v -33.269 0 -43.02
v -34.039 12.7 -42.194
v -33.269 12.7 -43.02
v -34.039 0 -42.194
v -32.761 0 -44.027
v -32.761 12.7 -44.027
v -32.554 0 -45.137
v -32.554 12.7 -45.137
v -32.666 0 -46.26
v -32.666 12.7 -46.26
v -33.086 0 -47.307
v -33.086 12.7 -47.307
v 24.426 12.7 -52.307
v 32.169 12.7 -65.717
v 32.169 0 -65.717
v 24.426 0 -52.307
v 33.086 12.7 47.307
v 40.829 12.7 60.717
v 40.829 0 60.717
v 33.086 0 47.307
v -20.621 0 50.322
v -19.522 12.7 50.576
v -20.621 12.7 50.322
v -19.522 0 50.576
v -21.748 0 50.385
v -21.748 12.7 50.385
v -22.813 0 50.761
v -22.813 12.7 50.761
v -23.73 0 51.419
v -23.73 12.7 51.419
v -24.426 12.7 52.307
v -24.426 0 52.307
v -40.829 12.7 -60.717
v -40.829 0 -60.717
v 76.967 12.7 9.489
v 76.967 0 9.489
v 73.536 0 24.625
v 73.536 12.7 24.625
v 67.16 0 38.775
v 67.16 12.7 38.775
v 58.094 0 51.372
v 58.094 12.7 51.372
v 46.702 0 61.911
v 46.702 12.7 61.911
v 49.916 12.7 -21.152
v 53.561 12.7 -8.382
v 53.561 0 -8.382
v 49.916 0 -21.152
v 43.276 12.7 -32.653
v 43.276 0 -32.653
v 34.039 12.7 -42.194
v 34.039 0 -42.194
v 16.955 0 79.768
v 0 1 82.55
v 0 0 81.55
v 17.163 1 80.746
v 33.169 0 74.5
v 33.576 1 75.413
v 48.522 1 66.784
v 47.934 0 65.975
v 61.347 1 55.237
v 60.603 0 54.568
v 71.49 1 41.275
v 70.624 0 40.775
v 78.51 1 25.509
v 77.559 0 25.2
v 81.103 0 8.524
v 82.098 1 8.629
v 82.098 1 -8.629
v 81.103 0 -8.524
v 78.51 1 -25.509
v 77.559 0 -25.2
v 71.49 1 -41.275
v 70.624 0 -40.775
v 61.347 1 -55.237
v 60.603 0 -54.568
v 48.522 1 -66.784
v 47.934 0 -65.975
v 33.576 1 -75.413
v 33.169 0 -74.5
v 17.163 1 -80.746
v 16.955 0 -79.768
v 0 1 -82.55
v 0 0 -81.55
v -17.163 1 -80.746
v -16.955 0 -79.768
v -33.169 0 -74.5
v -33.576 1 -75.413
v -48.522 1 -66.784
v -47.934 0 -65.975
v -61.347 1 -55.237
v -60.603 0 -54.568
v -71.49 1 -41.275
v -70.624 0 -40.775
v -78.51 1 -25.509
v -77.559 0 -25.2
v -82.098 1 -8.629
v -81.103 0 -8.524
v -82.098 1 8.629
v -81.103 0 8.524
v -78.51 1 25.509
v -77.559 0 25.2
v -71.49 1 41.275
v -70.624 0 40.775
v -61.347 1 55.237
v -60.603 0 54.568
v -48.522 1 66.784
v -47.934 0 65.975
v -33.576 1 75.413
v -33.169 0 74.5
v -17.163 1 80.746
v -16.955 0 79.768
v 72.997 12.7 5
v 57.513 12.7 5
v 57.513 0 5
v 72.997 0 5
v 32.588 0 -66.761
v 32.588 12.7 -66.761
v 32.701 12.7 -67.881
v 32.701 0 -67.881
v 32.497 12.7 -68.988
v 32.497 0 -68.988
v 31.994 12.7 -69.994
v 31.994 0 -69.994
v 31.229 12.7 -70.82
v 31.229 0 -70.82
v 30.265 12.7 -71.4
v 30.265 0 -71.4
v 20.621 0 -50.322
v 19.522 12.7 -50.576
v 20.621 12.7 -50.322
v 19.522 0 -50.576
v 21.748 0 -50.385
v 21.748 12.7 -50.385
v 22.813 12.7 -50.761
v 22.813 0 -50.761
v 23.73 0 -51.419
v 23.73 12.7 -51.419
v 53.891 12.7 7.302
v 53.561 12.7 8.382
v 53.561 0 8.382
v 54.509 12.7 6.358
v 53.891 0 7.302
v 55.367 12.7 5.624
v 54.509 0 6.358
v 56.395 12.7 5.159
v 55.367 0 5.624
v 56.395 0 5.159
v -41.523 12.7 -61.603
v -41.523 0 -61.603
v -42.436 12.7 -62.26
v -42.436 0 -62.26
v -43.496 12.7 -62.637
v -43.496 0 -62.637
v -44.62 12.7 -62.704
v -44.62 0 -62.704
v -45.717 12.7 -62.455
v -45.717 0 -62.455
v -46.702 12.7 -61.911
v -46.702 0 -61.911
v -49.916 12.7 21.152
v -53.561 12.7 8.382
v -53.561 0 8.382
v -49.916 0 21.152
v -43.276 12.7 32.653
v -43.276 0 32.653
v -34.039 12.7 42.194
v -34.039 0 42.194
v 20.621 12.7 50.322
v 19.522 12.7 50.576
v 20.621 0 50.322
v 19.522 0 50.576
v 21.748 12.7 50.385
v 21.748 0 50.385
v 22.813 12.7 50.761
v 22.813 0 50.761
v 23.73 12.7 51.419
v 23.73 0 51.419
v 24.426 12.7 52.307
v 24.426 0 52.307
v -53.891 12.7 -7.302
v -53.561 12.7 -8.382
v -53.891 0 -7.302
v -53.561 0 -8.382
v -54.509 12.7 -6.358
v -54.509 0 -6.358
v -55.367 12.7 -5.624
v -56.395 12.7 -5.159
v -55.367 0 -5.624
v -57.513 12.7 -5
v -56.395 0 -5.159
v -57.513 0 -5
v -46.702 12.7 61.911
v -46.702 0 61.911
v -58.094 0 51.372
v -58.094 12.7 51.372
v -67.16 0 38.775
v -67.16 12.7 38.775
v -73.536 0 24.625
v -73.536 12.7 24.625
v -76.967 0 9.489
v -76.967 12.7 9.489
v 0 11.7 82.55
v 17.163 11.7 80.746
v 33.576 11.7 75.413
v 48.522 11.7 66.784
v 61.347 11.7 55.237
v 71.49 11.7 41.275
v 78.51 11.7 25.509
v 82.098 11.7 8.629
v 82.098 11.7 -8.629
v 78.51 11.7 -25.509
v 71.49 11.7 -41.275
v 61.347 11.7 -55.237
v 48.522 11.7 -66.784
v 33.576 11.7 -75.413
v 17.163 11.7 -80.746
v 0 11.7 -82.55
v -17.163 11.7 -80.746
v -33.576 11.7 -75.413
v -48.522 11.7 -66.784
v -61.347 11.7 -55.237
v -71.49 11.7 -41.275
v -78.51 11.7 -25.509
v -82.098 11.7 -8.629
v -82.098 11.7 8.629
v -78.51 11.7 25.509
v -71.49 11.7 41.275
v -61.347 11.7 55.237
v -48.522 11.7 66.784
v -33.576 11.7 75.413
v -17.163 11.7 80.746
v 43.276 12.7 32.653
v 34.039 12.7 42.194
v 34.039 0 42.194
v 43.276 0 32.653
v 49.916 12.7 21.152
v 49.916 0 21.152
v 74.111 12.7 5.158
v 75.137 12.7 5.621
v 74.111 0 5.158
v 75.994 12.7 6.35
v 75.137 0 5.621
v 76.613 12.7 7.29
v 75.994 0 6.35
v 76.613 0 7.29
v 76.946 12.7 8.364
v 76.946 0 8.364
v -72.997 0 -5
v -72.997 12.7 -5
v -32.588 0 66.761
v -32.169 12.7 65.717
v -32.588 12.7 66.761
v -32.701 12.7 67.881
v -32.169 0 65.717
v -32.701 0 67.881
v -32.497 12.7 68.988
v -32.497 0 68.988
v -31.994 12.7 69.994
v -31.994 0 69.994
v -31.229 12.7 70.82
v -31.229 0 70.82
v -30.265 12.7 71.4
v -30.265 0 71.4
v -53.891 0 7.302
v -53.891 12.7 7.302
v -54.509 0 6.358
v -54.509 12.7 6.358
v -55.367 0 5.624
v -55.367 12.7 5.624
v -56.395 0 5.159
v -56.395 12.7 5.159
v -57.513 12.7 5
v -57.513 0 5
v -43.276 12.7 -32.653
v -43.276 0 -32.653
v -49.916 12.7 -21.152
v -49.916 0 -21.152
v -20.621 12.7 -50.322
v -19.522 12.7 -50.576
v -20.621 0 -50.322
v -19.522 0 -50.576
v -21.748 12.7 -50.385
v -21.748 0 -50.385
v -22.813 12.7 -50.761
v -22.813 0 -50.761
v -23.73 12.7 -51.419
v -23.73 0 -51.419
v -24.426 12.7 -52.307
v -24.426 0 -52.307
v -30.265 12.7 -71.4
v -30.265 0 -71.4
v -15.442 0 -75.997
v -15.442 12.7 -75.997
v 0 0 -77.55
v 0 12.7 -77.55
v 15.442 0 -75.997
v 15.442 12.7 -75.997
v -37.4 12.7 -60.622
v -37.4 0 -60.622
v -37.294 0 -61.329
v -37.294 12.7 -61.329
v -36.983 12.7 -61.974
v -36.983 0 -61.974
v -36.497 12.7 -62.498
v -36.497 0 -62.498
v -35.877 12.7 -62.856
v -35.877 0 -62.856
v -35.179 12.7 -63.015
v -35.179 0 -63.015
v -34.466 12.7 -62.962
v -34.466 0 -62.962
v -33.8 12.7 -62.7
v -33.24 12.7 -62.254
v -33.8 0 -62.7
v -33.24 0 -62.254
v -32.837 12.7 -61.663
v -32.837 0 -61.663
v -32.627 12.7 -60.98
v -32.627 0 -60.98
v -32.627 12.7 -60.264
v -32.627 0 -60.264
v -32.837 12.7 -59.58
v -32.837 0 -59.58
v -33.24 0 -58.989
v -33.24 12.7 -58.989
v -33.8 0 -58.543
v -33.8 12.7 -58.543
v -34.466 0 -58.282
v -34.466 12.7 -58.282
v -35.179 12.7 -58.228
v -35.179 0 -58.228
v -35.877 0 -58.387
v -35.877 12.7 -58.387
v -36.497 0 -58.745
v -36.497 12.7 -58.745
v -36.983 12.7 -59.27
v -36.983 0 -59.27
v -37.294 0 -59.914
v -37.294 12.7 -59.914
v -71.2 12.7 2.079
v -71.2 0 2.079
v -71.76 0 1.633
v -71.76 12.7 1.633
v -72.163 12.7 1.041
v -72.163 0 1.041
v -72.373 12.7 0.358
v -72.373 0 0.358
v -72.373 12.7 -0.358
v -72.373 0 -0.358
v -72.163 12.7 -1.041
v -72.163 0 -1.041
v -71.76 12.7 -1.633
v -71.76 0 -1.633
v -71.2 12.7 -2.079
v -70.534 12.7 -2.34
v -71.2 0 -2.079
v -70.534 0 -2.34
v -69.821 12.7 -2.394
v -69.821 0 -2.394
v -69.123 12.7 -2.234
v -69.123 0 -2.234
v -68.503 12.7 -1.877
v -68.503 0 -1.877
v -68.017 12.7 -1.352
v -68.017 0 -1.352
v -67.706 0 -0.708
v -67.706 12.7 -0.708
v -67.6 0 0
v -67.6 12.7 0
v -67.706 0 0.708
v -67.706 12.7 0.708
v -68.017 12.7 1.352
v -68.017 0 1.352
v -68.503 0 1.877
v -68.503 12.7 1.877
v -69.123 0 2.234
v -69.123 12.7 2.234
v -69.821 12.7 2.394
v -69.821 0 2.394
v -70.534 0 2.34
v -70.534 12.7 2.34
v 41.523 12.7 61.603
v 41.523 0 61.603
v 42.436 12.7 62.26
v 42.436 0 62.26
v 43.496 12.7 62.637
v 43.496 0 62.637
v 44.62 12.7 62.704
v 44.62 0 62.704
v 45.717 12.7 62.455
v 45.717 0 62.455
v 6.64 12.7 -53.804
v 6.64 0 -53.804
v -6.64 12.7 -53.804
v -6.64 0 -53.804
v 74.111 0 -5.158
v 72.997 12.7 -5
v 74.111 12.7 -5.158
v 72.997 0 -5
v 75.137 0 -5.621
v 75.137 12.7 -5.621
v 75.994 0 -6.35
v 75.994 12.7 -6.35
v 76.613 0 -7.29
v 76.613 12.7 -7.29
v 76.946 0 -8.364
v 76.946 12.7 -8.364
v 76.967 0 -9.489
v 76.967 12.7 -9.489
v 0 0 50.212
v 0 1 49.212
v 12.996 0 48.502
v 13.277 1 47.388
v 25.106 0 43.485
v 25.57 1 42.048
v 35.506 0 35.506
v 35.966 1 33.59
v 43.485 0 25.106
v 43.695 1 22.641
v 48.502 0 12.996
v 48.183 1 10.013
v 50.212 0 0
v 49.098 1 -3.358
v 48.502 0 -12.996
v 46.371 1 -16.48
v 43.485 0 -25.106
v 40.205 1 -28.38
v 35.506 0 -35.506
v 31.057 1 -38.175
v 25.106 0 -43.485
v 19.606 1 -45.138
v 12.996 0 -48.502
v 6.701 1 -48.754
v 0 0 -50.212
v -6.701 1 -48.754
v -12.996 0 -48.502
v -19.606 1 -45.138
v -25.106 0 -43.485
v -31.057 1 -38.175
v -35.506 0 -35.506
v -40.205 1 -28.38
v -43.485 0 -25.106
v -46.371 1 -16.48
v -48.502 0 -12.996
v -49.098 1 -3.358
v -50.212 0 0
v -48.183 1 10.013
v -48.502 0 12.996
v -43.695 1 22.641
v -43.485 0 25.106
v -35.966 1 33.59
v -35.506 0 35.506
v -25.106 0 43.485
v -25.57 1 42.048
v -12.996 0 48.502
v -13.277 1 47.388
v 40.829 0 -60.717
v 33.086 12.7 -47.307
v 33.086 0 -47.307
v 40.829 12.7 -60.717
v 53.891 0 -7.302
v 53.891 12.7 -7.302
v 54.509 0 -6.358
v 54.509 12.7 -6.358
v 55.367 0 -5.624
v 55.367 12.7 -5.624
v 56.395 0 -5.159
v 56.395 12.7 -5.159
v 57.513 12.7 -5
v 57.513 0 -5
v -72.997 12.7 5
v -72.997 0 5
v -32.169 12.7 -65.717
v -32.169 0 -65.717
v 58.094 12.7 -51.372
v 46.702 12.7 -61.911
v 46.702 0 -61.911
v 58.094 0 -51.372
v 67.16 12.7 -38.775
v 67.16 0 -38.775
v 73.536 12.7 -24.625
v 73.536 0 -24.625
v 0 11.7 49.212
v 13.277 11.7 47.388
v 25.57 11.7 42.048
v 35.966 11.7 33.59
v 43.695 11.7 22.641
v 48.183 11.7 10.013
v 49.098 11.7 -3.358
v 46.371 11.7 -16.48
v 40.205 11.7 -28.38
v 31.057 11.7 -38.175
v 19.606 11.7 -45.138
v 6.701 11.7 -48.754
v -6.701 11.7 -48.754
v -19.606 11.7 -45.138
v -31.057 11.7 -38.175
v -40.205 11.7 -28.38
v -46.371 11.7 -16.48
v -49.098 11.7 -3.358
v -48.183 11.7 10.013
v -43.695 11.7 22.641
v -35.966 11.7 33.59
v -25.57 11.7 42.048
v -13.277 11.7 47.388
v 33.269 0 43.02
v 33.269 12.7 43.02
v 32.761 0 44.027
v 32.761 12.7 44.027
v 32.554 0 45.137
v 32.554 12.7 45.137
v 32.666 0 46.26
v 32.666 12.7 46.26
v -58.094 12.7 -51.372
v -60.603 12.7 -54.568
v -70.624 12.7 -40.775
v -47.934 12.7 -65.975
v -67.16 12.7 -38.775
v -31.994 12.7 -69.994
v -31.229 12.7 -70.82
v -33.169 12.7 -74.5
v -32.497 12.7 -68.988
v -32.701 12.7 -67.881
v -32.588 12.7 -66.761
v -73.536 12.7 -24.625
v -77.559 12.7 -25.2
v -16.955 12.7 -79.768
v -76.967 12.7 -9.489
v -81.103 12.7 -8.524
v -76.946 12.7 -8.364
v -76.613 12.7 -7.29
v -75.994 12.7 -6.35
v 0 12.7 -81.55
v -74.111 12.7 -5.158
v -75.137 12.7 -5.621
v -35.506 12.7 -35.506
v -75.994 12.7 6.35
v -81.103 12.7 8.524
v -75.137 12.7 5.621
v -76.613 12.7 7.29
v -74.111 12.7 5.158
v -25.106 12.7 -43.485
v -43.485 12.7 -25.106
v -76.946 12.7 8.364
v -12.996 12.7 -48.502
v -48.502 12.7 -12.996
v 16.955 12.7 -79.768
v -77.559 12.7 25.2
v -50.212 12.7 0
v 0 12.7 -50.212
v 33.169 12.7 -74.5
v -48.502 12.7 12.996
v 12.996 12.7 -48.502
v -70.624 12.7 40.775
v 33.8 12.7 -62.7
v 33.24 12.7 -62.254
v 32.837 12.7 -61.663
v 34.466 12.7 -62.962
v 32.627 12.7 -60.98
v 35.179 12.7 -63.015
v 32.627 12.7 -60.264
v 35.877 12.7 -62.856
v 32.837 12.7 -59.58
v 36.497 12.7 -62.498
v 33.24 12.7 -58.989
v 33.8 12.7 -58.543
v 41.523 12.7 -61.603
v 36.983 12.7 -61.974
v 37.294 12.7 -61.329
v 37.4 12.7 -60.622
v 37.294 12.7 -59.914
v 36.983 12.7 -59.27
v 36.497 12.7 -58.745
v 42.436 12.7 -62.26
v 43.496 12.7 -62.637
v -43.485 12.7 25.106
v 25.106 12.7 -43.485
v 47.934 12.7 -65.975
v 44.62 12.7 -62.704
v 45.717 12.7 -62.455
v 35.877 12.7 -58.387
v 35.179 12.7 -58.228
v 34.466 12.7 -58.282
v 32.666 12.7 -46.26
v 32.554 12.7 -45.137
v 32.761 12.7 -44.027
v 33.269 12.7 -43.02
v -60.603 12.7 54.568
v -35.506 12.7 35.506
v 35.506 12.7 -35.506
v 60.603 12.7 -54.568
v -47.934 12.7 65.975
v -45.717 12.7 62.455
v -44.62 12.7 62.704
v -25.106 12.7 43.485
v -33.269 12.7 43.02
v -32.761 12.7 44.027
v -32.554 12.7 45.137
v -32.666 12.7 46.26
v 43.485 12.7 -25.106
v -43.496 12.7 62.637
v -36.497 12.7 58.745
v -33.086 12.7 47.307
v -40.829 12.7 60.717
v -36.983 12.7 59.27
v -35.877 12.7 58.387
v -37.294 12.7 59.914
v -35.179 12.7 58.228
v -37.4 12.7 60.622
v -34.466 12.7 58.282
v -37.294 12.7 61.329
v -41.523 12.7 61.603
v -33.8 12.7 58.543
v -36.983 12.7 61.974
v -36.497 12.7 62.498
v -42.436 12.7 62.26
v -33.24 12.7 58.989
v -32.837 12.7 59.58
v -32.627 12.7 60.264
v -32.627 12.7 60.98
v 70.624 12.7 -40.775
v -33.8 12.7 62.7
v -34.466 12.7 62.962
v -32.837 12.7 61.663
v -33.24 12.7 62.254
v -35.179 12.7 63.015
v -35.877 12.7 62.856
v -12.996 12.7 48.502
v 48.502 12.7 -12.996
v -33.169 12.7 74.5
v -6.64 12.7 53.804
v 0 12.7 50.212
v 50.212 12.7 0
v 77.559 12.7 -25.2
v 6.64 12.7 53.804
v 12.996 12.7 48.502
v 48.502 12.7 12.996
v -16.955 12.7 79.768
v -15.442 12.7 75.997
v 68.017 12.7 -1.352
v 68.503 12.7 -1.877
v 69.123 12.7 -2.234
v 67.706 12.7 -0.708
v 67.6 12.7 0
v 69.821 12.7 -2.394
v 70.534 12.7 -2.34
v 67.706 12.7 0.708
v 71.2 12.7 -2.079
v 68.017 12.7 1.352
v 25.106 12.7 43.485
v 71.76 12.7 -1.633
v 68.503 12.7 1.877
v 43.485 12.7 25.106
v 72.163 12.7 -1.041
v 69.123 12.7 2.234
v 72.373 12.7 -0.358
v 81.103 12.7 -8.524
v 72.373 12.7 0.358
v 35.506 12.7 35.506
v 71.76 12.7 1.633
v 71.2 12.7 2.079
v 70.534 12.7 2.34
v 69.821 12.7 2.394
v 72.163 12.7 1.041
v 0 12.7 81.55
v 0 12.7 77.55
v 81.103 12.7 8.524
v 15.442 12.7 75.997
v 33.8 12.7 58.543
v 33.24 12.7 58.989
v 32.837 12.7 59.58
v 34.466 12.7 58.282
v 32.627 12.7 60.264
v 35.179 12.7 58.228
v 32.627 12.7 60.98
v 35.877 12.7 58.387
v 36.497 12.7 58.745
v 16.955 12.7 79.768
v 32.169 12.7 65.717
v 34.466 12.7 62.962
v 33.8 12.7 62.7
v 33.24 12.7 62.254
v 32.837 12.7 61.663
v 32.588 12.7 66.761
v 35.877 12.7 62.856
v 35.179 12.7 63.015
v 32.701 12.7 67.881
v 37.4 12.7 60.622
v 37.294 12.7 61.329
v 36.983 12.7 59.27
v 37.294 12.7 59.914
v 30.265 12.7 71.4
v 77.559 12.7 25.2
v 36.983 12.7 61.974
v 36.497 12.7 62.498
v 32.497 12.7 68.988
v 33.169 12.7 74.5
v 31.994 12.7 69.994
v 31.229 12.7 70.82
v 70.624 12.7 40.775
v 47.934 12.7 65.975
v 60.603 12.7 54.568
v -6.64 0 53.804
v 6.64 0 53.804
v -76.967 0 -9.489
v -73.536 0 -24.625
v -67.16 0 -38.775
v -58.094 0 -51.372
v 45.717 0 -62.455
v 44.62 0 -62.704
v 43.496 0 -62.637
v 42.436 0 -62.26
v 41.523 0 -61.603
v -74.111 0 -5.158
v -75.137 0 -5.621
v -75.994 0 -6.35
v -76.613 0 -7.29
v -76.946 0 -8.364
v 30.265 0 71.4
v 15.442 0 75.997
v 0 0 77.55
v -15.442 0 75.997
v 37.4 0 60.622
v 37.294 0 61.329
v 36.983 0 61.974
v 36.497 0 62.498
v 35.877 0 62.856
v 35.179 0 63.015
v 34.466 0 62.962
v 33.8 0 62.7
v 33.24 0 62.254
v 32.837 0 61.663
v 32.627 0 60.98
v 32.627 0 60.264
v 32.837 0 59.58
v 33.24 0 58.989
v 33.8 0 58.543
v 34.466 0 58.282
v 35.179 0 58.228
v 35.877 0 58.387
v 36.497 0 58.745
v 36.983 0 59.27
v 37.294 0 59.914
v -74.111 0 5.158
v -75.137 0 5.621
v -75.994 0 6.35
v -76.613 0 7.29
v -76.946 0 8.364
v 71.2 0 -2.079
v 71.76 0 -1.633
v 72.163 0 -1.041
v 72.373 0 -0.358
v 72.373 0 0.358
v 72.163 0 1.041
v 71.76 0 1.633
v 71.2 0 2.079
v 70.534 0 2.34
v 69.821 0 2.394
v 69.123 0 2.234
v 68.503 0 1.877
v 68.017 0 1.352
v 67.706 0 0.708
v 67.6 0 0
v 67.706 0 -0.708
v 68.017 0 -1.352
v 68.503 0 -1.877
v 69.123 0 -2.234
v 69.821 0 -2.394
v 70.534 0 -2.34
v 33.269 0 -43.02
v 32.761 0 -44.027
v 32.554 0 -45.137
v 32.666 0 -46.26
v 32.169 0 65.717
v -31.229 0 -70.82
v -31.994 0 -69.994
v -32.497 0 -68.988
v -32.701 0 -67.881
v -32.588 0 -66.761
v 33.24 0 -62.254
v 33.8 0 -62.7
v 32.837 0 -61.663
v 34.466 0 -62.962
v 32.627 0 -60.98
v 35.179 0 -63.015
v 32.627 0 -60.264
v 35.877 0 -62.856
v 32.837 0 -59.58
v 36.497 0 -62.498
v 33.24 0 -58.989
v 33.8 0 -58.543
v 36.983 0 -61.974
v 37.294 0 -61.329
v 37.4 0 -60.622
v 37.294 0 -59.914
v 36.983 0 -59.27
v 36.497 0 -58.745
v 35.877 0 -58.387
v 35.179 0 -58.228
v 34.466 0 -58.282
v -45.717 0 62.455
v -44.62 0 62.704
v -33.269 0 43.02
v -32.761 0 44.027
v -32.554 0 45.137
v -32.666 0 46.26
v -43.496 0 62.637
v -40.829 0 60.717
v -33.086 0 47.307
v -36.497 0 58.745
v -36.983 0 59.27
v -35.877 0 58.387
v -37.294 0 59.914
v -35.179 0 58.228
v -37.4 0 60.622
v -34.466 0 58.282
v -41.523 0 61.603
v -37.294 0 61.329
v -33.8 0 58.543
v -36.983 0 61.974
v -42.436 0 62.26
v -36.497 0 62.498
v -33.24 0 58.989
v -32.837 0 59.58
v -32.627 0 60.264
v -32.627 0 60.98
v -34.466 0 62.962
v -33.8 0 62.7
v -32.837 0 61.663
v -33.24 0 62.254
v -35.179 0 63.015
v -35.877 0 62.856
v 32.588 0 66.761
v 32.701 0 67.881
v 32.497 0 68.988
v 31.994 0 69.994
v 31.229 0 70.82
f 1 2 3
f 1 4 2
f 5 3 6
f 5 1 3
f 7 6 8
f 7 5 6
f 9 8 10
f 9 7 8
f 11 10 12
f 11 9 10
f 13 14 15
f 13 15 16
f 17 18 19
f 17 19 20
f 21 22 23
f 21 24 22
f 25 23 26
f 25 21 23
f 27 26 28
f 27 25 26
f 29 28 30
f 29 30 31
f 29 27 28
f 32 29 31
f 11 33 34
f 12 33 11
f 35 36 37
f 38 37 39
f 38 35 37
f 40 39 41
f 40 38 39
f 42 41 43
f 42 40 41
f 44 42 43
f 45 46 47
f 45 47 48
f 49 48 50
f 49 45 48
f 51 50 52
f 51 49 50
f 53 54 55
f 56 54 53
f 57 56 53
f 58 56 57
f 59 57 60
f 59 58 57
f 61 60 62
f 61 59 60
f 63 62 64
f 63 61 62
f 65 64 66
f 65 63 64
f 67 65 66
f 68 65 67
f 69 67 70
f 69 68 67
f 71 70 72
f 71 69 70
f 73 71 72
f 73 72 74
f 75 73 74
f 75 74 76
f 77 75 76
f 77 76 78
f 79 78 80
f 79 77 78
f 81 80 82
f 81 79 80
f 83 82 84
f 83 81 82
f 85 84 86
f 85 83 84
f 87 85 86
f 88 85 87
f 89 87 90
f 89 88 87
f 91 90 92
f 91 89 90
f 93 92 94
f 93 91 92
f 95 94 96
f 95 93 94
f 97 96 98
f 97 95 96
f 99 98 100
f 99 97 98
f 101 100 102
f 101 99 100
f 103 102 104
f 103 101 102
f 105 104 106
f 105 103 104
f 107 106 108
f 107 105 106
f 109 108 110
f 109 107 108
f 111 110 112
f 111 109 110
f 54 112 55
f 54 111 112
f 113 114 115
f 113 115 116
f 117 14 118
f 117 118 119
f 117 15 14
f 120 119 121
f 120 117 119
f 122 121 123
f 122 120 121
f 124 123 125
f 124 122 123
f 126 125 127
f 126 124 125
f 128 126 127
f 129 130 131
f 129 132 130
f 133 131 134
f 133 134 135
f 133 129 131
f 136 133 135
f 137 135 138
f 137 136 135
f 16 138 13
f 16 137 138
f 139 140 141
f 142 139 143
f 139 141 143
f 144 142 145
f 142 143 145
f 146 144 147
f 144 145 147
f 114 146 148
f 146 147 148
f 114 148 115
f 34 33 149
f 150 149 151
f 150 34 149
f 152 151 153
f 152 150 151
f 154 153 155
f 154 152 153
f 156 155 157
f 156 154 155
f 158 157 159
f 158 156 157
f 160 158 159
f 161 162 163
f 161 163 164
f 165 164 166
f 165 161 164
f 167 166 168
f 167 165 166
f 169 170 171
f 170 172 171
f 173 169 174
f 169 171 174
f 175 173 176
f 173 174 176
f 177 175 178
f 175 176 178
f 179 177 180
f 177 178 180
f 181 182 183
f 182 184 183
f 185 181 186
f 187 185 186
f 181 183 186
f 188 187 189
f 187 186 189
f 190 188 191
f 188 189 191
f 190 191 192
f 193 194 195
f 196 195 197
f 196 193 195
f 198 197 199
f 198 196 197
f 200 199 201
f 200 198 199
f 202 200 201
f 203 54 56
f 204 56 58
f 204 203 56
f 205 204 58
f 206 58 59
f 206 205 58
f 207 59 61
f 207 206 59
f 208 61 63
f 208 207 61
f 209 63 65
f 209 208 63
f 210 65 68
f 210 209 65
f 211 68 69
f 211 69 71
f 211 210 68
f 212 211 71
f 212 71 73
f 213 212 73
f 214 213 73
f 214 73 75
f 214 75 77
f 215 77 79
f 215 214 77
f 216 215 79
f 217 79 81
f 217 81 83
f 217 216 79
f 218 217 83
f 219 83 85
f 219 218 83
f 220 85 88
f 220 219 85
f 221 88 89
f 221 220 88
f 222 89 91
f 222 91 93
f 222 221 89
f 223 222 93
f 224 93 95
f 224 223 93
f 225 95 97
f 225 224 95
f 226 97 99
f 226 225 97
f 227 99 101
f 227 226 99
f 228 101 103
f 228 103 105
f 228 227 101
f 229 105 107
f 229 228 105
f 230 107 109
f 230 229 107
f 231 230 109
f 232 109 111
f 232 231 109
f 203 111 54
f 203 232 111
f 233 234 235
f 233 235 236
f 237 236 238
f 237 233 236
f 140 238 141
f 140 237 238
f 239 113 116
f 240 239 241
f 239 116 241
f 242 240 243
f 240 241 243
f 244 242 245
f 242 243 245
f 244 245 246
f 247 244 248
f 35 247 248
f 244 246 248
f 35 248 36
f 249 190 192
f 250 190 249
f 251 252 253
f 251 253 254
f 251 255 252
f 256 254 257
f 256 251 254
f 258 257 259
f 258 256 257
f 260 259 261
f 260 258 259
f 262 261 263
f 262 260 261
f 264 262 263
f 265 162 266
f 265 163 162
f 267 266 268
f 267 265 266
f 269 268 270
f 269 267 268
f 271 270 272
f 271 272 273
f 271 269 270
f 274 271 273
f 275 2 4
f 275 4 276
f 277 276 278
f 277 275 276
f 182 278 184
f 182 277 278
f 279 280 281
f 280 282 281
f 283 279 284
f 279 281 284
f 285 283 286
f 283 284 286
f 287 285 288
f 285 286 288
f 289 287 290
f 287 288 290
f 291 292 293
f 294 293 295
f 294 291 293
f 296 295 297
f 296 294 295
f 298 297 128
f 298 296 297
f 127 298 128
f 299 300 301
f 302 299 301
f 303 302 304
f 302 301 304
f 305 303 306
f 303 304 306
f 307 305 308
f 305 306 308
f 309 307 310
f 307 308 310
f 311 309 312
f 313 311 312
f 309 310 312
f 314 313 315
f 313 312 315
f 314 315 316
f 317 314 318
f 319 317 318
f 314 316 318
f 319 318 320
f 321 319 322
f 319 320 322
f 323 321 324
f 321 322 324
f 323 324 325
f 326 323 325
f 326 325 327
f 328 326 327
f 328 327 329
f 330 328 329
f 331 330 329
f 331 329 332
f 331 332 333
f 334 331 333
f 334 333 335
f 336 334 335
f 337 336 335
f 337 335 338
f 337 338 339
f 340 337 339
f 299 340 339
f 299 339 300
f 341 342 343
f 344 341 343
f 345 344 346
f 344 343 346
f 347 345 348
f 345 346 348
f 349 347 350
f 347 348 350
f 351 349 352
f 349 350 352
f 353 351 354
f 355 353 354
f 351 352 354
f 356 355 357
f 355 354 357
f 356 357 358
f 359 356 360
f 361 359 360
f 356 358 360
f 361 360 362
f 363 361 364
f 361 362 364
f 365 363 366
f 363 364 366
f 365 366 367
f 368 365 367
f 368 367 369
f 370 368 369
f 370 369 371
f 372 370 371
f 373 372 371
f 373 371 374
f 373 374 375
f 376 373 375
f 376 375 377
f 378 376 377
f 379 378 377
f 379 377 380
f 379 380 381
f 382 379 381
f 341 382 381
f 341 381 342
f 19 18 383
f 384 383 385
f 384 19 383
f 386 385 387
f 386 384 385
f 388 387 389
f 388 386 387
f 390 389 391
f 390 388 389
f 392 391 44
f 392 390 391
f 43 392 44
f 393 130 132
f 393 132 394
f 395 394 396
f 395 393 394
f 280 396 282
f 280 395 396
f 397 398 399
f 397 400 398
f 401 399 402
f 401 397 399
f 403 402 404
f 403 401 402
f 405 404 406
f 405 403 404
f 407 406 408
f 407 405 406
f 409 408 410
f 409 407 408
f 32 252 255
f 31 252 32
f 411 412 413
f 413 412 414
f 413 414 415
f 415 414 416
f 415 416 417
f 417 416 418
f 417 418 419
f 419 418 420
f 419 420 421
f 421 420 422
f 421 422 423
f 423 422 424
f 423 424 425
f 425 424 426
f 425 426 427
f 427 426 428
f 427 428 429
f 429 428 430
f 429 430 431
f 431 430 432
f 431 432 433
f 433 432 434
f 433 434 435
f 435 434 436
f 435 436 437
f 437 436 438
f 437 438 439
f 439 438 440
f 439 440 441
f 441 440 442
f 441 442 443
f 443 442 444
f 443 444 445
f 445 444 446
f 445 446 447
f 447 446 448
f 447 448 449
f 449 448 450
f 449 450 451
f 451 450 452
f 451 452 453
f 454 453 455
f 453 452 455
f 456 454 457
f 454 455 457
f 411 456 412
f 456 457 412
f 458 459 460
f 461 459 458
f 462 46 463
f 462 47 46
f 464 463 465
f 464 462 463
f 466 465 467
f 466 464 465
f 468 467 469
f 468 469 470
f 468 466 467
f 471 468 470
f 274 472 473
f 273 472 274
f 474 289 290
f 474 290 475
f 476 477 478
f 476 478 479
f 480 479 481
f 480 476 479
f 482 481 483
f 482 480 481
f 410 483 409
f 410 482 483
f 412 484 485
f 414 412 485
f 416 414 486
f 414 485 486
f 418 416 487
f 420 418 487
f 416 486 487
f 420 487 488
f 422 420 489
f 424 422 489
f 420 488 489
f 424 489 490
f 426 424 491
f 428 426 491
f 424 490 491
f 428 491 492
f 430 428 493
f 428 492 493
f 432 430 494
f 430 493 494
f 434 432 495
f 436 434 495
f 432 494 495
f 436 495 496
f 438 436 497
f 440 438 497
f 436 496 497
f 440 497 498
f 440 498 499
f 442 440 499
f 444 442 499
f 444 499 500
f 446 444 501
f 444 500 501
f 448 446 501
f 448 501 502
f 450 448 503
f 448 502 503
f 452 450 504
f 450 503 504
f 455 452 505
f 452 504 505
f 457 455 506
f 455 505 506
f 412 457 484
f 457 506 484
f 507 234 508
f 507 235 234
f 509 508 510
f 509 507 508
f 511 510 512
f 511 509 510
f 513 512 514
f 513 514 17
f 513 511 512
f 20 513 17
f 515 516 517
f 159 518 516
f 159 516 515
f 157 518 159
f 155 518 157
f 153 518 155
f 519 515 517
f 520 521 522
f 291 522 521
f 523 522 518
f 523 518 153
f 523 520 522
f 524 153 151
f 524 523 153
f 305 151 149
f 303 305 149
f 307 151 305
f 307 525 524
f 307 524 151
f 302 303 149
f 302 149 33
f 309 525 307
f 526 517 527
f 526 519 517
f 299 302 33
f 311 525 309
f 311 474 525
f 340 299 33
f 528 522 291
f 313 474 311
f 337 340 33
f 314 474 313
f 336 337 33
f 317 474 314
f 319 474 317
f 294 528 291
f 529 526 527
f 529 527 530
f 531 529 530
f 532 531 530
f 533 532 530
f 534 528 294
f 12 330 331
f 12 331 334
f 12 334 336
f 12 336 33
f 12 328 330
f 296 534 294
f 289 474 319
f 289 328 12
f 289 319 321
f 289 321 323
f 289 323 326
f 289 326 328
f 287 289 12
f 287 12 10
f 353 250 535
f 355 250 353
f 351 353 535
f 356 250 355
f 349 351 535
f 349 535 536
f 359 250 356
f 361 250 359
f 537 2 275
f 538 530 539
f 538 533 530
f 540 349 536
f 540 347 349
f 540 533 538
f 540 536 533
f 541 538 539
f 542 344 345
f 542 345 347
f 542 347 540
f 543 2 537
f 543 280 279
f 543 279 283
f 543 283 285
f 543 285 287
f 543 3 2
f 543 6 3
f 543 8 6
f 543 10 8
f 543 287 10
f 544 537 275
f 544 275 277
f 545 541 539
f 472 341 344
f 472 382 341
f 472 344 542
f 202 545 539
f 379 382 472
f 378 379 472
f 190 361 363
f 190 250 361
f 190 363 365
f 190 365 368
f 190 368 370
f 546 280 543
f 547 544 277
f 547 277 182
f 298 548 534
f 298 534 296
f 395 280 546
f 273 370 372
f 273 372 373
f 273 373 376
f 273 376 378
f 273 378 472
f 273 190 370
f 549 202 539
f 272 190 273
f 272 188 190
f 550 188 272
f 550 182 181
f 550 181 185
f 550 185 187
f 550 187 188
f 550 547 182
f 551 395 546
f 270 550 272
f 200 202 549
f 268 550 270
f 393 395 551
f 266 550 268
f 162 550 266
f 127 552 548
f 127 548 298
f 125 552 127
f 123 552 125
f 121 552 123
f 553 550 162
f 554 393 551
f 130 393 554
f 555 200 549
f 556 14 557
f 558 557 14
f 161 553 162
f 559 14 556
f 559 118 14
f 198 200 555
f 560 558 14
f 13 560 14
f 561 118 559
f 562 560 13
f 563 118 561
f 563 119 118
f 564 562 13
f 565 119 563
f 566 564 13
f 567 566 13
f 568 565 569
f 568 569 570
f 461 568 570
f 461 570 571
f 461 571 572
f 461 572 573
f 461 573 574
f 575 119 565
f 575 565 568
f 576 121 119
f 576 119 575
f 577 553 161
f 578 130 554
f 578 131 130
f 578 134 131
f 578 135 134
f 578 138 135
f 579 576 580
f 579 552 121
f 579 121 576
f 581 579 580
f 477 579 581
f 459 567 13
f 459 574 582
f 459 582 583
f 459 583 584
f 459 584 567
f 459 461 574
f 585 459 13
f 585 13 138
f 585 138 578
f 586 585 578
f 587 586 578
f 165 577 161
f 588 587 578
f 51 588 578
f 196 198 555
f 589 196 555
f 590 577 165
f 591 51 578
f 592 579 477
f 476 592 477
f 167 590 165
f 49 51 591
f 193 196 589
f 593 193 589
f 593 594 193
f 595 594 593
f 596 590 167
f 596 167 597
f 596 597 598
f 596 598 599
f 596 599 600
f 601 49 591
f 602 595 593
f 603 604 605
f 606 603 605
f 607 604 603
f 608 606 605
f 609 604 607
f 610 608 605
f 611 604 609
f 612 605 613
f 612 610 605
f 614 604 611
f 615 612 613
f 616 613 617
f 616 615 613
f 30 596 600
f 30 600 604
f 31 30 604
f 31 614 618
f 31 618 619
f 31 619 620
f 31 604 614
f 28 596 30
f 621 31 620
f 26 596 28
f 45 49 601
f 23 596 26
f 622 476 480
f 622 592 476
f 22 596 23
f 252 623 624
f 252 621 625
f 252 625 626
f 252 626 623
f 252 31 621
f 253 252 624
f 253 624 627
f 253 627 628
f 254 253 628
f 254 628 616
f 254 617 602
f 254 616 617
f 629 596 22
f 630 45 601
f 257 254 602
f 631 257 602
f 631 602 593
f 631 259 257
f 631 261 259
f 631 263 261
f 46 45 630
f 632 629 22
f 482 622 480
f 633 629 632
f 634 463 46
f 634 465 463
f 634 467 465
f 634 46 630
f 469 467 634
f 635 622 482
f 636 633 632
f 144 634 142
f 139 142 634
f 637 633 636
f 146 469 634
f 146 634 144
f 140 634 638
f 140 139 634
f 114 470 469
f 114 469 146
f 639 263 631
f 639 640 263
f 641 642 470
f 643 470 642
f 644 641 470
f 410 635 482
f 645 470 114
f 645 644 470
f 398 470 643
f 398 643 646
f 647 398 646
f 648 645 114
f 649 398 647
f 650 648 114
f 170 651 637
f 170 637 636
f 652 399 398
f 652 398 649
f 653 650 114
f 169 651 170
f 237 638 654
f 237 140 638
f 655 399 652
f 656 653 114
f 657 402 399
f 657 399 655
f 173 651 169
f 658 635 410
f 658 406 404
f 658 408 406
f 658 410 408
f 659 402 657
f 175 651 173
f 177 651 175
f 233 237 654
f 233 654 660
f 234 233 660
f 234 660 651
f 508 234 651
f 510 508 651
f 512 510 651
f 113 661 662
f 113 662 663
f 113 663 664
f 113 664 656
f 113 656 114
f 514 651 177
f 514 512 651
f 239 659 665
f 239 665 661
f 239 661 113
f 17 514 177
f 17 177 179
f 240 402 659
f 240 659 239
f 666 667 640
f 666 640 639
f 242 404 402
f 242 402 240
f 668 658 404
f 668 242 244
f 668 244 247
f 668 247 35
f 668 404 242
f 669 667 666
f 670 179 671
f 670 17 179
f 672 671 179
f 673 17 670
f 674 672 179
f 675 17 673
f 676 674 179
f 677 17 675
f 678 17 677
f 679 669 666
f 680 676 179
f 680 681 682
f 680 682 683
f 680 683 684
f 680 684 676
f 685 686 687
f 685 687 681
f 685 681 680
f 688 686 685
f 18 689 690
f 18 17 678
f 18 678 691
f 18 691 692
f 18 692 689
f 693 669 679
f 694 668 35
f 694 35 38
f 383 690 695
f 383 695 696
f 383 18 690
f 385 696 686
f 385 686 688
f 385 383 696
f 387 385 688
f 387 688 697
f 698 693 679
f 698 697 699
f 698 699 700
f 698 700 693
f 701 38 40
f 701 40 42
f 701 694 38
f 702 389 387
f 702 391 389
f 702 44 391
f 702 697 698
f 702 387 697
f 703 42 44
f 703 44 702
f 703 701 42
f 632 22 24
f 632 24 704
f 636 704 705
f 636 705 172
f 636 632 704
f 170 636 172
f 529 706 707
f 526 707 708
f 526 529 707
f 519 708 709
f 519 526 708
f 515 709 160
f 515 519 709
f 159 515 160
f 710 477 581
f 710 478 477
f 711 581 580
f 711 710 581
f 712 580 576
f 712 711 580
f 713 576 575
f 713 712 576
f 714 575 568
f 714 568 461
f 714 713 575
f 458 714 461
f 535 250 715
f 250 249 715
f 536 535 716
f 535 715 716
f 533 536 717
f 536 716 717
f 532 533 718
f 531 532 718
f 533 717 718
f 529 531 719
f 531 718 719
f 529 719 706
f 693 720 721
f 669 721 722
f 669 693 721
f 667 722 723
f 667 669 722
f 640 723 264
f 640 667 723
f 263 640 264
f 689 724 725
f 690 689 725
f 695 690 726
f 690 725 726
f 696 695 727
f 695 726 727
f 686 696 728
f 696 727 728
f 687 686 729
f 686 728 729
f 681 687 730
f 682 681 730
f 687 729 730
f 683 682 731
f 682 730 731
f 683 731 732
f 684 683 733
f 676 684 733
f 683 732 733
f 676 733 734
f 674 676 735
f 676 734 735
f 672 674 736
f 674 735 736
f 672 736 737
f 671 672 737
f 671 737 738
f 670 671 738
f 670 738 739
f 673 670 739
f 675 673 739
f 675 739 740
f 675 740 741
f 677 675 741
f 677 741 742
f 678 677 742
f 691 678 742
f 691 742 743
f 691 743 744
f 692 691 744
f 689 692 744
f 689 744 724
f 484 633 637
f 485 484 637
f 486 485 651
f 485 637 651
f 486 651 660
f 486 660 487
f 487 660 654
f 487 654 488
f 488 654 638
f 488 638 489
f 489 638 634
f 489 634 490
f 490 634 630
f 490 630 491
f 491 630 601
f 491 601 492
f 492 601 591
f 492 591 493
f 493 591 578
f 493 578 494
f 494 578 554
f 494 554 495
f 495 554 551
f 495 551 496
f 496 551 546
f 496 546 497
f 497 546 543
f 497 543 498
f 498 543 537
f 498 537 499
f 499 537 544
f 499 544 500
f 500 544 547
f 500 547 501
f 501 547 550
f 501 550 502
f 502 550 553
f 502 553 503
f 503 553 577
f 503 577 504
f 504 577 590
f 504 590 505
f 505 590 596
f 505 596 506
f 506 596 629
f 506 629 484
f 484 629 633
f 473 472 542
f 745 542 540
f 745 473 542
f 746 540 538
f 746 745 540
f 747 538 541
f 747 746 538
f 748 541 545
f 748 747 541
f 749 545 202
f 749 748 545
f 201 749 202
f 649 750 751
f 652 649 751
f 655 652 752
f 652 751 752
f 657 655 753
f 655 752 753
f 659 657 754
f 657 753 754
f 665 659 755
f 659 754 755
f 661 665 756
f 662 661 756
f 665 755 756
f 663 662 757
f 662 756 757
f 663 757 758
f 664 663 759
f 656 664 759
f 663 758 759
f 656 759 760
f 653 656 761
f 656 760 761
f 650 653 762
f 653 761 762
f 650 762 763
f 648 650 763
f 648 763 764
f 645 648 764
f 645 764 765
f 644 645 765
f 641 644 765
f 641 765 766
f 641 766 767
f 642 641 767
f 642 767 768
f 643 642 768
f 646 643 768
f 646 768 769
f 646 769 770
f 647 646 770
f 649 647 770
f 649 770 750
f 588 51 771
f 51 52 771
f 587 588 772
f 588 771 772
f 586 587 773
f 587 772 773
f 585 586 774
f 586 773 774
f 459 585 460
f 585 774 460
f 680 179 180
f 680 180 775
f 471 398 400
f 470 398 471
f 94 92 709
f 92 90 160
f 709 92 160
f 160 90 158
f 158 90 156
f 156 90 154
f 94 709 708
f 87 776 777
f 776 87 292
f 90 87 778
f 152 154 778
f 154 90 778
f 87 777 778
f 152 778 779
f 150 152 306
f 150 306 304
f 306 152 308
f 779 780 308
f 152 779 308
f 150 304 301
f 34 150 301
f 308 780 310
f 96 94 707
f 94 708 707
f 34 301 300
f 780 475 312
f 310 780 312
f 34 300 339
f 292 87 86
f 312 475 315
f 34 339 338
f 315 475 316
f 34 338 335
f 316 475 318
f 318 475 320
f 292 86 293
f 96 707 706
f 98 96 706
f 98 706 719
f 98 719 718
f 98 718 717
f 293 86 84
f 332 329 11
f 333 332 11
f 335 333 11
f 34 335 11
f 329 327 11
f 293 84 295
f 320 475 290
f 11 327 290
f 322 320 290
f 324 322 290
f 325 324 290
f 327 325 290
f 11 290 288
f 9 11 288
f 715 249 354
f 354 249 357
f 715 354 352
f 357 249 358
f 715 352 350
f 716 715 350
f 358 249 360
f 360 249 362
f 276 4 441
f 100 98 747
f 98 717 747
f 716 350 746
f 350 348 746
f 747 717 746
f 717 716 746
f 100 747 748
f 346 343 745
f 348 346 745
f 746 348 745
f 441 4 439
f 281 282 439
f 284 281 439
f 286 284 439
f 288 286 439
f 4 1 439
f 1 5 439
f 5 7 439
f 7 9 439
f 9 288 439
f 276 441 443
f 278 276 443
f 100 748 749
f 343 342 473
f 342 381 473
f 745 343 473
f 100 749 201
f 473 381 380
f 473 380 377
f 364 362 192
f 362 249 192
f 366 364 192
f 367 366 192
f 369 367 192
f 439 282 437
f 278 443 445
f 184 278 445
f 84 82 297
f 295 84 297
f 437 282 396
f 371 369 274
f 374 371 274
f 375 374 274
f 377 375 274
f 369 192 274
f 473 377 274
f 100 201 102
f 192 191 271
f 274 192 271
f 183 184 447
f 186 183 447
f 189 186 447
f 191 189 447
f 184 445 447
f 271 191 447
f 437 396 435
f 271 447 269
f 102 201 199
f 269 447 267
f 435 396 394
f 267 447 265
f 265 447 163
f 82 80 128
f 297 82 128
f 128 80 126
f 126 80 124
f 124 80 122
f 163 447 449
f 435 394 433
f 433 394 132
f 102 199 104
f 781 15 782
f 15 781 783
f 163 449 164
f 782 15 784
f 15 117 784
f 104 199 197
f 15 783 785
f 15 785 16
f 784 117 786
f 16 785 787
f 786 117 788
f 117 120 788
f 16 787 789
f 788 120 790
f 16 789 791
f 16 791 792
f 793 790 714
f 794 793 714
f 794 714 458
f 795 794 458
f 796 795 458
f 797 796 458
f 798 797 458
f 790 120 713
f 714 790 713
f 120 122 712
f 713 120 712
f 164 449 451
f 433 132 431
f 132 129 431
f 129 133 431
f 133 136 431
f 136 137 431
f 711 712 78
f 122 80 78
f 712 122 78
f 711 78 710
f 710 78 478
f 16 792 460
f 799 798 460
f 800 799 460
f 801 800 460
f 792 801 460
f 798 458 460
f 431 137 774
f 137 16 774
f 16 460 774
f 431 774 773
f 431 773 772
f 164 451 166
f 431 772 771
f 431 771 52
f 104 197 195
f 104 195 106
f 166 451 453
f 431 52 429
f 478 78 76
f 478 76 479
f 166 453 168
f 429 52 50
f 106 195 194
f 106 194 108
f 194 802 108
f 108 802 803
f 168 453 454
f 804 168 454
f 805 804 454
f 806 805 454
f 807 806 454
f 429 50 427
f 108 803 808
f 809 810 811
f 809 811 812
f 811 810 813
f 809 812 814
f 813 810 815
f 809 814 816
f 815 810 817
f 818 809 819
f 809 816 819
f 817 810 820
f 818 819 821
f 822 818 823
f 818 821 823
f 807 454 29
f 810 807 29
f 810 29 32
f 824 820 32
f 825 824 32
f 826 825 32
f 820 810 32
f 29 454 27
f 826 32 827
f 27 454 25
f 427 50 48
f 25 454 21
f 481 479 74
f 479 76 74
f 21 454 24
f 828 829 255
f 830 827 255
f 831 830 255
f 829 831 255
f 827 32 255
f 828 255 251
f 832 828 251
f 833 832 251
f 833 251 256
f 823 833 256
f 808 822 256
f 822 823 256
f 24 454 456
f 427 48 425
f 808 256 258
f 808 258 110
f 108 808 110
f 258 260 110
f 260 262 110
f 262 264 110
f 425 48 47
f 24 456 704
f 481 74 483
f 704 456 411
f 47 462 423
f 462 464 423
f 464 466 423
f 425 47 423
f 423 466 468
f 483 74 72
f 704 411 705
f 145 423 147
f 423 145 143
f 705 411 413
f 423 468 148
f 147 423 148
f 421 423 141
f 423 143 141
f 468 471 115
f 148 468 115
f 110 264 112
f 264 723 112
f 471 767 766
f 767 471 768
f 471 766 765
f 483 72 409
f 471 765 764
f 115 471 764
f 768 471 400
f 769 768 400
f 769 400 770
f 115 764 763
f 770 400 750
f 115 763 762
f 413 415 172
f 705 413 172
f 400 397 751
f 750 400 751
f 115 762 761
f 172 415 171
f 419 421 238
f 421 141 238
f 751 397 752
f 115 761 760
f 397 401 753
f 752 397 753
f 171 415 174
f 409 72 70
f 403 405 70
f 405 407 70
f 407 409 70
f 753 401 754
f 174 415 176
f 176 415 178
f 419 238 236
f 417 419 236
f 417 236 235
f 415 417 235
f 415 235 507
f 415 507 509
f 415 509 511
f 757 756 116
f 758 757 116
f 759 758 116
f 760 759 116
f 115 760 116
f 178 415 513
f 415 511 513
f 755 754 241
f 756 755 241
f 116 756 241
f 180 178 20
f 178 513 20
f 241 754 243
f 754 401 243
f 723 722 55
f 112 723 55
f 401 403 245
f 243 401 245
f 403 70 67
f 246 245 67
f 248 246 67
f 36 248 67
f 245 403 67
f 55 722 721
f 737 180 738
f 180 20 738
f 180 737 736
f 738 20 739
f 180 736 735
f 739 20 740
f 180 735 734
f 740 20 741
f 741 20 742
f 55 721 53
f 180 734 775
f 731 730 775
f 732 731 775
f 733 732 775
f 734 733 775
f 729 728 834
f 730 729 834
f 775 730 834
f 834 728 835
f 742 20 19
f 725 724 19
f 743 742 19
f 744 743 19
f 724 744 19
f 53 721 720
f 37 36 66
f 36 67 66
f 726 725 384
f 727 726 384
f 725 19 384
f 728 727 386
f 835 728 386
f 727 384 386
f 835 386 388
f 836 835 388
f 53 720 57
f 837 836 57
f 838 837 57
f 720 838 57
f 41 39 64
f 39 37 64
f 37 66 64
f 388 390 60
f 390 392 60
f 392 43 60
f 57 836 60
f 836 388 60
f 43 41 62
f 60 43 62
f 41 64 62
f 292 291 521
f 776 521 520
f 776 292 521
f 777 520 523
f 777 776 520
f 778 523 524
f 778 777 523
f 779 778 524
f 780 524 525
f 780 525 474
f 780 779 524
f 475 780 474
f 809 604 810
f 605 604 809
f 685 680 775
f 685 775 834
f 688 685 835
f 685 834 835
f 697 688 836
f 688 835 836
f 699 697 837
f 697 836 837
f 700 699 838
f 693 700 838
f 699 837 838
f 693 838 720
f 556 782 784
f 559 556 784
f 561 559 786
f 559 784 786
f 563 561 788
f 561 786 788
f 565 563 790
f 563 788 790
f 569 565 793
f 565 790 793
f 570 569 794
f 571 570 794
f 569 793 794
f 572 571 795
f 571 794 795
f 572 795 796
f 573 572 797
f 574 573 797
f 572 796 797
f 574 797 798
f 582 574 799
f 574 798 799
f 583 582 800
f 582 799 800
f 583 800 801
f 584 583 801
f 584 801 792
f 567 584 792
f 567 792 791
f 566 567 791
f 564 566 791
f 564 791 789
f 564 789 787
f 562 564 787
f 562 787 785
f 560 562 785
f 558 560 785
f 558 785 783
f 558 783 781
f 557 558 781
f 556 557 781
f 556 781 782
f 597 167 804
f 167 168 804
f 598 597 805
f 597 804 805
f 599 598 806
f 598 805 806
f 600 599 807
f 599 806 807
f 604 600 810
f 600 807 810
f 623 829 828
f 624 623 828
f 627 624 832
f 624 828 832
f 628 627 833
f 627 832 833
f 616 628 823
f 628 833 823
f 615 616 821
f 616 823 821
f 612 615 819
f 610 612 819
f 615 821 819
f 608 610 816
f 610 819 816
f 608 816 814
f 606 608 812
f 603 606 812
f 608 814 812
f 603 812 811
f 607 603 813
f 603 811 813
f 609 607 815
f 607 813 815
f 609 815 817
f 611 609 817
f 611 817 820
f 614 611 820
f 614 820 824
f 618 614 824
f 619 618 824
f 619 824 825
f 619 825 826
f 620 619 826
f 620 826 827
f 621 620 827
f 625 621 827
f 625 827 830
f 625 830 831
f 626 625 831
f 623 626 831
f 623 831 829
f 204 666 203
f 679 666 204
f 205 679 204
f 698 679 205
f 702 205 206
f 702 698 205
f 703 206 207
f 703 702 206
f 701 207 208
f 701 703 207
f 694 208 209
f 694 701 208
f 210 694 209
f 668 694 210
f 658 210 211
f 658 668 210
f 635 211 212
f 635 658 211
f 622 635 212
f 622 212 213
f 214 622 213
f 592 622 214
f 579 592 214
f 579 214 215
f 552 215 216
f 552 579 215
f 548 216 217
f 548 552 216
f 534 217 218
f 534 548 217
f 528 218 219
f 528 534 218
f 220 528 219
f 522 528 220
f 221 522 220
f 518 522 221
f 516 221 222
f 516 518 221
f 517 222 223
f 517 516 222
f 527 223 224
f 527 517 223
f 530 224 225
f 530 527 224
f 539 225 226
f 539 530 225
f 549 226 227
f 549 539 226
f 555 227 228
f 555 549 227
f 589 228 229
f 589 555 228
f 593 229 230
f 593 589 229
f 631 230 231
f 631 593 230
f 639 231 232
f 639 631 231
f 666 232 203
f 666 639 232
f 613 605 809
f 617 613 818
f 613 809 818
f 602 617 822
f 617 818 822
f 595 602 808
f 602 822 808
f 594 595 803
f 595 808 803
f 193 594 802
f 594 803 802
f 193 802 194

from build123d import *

# Parameters (mm, degrees)
SKETCH2_W                   = 33.3375
SKETCH2_H                   = 12.7
F_12_0_189_DIAMETER_HOLE1_D = 4.8006
CIRPATTERN3_COUNT           = 6
CUT_EXTRUDE1_DEPTH          = 13.7
FILLET1_R                   = 4
CIRPATTERN4_COUNT           = 6
FILLET1_OF_CIRPATTERN4_R    = 4
CHAMFER1_SIZE               = 1
CHAMFER2_SIZE               = 1


with BuildPart() as part:
    # Sketch2 → Revolve1 (revolve)
    with BuildSketch(Plane(origin=(0, 0, 0), x_dir=(0, 0, -1), z_dir=(1, 0, 0))):
        with Locations((-65.88125, 6.35)):
            Rectangle(SKETCH2_W, SKETCH2_H)
    revolve(axis=Axis((0, -0.635, 0), (0, 1, 0)))

    # #12 (0.189) Diameter Hole1 (through all)
    with Locations(Plane(origin=(0, 12.7, 0), x_dir=(1, 0, 0), z_dir=(0, 1, 0))):
        with Locations((-35, 60.621778)):
            f_12_0_189_diameter_hole1 = Hole(F_12_0_189_DIAMETER_HOLE1_D / 2)

    # CirPattern3: #12 (0.189) Diameter Hole1 ×6 about axis
    cirpattern3_axis = Axis((0, 0, 0), (0, 1, 0))
    for i in range(1, CIRPATTERN3_COUNT):
        add(f_12_0_189_diameter_hole1.rotate(cirpattern3_axis, i * 360 / CIRPATTERN3_COUNT), mode=Mode.SUBTRACT)

    # Sketch8 → Cut-Extrude1 (cut, through all)
    with BuildSketch(Plane(origin=(0, 12.7, 0), x_dir=(1, 0, 0), z_dir=(0, 1, 0))):
        with BuildLine():
            Line((-22.66059, 49.249293), (-34.364196, 69.520533))
            ThreePointArc((-34.364196, 69.520533), (0, 77.55), (34.364196, 69.520533))
            Line((34.364196, 69.520533), (22.66059, 49.249293))
            ThreePointArc((22.66059, 49.249293), (0, 54.2125), (-22.66059, 49.249293))
        make_face()
    cut_extrude1 = extrude(amount=-CUT_EXTRUDE1_DEPTH, mode=Mode.SUBTRACT)

    # Fillet1
    fillet1_edges = [part.edges().sort_by_distance(p)[0] for p in [
        (22.66059, 6.35, -49.249293),
        (-22.66059, 6.35, -49.249293),
        (-34.364196, 6.35, -69.520533),
        (34.364196, 6.35, -69.520533),
    ]]
    fillet(fillet1_edges, radius=FILLET1_R)

    # CirPattern4: Cut-Extrude1 ×6 about axis
    cirpattern4_axis = Axis((0, 0, 0), (0, 1, 0))
    for i in range(1, CIRPATTERN4_COUNT):
        add(cut_extrude1.rotate(cirpattern4_axis, i * 360 / CIRPATTERN4_COUNT), mode=Mode.SUBTRACT)

    # Fillet1 of CirPattern4
    fillet1_of_cirpattern4_edges = [part.edges().sort_by_distance(p)[0] for p in [
        (-31.320844, 6.35, -44.249293),
        (-53.981433, 6.35, -5),
        (-77.388646, 6.35, -5),
        (-43.02445, 6.35, -64.520533),
        (-53.981433, 6.35, 5),
        (-31.320844, 6.35, 44.249293),
        (-43.02445, 6.35, 64.520533),
        (-77.388646, 6.35, 5),
        (-22.66059, 6.35, 49.249293),
        (22.66059, 6.35, 49.249293),
        (34.364196, 6.35, 69.520533),
        (-34.364196, 6.35, 69.520533),
        (31.320844, 6.35, 44.249293),
        (53.981433, 6.35, 5),
        (77.388646, 6.35, 5),
        (43.02445, 6.35, 64.520533),
        (53.981433, 6.35, -5),
        (31.320844, 6.35, -44.249293),
        (43.02445, 6.35, -64.520533),
        (77.388646, 6.35, -5),
    ]]
    fillet(fillet1_of_cirpattern4_edges, radius=FILLET1_OF_CIRPATTERN4_R)

    # Chamfer1
    chamfer1_edges = [part.edges().sort_by_distance(p)[0] for p in [
        (0, 12.7, -49.2125),
        (0, 0, -49.2125),
    ]]
    chamfer(chamfer1_edges, length=CHAMFER1_SIZE)

    # Chamfer2
    chamfer2_edges = [part.edges().sort_by_distance(p)[0] for p in [
        (0, 12.7, -82.55),
        (0, 0, -82.55),
    ]]
    chamfer(chamfer2_edges, length=CHAMFER2_SIZE)


solid = part.part
